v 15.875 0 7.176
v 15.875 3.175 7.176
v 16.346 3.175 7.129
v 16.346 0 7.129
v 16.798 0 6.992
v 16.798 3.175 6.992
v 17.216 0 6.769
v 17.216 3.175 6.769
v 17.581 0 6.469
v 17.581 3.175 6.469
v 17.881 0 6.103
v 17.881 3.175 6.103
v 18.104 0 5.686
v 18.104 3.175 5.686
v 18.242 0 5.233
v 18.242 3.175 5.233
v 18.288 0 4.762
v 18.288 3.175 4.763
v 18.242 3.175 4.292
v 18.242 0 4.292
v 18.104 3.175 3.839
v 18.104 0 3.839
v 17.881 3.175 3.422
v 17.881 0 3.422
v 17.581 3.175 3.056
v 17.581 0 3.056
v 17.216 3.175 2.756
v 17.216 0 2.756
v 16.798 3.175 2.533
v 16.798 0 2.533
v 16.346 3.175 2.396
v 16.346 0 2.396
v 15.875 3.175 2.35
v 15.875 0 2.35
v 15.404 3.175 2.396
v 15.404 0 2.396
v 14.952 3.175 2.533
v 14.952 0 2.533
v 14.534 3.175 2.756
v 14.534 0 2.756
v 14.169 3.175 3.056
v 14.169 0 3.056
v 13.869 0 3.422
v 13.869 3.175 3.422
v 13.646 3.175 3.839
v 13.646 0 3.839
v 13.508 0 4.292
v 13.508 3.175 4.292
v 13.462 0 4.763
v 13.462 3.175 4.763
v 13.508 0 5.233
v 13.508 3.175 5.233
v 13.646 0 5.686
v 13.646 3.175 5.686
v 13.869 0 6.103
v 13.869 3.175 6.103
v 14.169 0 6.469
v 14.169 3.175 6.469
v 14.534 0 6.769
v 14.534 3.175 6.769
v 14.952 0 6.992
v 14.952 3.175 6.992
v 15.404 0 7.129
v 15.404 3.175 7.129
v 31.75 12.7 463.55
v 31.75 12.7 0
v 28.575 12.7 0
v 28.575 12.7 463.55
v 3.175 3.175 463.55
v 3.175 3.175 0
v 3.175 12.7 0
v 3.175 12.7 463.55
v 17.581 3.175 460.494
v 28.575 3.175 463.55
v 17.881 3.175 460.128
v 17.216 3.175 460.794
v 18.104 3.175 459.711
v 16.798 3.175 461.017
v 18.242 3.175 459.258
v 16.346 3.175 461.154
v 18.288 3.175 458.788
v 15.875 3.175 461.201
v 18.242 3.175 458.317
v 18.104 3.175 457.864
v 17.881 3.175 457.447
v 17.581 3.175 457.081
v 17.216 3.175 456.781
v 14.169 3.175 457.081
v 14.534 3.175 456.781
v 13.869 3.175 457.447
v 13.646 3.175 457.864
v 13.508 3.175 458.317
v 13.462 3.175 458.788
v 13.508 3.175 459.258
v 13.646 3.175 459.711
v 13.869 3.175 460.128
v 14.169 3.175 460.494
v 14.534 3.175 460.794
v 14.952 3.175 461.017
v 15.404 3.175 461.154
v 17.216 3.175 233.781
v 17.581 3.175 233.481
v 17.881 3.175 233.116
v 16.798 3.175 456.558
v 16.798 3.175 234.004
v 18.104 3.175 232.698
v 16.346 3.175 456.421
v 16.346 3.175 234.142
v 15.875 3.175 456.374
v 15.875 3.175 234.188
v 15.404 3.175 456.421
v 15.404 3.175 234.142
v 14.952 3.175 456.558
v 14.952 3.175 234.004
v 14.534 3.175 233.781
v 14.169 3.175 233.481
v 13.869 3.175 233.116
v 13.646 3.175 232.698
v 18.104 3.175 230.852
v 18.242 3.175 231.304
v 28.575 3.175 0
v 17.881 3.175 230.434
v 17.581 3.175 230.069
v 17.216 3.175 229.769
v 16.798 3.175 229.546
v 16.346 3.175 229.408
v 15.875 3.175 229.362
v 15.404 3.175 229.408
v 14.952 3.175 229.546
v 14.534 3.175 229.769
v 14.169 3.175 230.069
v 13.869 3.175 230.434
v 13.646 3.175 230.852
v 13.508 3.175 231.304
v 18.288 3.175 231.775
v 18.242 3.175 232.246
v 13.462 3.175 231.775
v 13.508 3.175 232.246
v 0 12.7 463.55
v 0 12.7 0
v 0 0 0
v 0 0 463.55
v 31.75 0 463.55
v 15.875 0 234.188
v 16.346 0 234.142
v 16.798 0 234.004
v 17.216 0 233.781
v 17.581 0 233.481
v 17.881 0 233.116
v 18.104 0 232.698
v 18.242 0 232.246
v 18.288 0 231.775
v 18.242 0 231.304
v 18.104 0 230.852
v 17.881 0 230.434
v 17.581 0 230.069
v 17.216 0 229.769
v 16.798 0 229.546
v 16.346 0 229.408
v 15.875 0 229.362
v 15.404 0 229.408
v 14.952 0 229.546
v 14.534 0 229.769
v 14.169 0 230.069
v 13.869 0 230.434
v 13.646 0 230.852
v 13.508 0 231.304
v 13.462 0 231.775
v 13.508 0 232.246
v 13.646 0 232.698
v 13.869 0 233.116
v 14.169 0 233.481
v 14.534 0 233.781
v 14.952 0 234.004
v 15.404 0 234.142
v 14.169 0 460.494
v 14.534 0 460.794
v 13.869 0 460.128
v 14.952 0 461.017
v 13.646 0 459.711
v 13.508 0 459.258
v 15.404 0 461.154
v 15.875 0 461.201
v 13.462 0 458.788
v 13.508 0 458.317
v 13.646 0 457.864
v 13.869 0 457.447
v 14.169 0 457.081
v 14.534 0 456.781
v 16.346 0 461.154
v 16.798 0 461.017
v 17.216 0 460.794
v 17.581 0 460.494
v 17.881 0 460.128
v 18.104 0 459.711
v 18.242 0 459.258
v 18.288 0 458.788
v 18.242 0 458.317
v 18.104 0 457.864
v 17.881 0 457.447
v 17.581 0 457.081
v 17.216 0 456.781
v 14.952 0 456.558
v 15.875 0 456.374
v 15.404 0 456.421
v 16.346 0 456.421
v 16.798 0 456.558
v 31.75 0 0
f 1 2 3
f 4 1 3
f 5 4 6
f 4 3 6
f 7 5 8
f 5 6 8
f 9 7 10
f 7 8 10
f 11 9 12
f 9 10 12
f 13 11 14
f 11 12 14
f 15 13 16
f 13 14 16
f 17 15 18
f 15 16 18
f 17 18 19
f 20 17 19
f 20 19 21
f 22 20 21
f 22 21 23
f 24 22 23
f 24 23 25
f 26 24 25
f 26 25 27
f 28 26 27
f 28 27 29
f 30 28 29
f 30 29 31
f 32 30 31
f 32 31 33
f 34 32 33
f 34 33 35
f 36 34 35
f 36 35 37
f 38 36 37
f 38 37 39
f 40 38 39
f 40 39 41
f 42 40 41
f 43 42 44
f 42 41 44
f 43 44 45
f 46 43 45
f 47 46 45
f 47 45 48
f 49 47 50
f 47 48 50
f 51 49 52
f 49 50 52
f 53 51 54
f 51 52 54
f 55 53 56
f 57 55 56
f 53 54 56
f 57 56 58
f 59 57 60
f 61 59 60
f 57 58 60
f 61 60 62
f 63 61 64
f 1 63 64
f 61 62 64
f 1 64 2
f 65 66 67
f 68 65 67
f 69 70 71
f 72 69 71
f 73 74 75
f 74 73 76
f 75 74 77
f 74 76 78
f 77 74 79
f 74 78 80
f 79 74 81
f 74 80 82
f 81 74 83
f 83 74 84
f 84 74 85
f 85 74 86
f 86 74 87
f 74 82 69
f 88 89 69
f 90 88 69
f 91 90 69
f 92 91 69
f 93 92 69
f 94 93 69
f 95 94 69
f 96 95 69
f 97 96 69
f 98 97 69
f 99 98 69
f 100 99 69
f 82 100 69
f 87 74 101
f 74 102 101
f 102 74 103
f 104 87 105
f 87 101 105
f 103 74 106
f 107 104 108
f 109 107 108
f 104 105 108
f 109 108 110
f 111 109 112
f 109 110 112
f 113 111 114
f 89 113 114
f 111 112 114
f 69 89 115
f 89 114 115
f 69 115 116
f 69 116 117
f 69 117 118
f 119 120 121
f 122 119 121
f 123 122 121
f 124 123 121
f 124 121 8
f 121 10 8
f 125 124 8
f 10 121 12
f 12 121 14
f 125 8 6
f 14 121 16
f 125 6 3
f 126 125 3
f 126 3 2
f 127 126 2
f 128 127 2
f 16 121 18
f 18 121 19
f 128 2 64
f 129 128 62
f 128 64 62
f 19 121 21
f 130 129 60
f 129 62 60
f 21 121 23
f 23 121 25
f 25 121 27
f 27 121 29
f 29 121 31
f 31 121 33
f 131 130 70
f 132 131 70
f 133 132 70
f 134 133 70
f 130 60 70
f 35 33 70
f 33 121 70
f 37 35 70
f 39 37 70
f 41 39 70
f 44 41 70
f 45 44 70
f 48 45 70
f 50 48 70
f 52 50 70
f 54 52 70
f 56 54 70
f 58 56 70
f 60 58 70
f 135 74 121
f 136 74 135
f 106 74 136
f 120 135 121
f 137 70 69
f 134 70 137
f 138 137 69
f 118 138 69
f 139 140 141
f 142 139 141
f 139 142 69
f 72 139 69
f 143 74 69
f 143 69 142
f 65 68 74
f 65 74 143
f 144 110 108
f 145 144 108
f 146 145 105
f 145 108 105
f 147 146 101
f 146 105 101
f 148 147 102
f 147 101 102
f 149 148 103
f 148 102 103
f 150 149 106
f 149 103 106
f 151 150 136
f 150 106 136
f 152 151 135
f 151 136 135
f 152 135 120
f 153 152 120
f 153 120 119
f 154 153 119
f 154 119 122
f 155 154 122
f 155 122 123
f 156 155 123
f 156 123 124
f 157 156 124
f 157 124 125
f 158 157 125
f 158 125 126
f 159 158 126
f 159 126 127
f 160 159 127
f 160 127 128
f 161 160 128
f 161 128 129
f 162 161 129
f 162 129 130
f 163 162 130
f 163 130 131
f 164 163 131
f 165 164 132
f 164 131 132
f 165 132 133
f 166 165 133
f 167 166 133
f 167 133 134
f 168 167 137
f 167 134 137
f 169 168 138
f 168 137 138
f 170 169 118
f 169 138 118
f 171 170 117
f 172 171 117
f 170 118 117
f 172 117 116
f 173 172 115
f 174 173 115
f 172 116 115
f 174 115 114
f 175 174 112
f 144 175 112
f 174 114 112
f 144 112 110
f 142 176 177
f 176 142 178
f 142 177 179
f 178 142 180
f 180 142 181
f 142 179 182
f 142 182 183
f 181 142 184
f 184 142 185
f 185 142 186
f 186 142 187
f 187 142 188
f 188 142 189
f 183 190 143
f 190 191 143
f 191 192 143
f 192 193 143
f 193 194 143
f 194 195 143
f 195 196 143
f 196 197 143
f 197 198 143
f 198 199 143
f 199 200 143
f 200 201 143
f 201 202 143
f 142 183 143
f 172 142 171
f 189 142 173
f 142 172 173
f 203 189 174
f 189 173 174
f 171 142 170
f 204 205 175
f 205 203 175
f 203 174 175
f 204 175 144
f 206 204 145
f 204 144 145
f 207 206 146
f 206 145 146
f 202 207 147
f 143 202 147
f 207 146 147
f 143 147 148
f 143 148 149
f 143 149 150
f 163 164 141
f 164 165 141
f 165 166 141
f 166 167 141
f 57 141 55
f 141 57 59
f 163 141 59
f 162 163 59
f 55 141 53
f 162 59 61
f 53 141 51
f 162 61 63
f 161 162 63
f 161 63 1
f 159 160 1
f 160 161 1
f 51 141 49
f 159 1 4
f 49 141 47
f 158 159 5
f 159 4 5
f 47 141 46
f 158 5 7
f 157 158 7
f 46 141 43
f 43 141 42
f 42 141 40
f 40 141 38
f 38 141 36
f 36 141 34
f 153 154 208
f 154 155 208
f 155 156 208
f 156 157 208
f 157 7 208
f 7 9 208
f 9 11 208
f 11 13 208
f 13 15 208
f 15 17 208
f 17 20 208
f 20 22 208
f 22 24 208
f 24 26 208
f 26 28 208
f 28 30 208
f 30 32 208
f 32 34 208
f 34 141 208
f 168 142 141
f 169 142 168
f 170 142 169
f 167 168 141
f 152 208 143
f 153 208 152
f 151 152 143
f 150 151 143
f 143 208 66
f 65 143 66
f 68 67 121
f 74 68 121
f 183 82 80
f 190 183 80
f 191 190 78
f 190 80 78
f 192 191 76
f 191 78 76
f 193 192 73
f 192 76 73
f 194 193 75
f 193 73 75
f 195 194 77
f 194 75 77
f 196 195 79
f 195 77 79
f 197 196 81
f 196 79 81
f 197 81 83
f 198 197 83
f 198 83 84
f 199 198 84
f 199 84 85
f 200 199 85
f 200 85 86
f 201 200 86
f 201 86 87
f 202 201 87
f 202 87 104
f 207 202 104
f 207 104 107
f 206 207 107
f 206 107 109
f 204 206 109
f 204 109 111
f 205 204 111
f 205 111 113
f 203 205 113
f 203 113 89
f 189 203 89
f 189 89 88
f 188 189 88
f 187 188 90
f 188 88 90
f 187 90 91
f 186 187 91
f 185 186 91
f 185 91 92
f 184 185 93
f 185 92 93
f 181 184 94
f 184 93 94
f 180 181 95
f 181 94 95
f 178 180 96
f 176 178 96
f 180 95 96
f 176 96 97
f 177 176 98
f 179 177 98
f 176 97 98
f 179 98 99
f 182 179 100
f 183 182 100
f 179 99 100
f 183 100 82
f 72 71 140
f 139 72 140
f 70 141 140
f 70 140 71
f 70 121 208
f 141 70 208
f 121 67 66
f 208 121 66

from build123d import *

# Parameters (mm, degrees)
BOSS_EXTRUDE1_DEPTH = 463.55
CUT_EXTRUDE1_REACH  = 466.734
SKETCH2_R           = 2.413
CUT_EXTRUDE2_REACH  = 466.734
SKETCH3_R           = 2.413


with BuildPart() as part:
    # Sketch1 → Boss-Extrude1 (new body)
    with BuildSketch(Plane.XY):
        Polygon((3.175, 3.175), (3.175, 12.7), (0, 12.7), (0, 0), (31.75, 0), (31.75, 12.7), (28.575, 12.7), (28.575, 3.175), align=None)
    extrude(amount=BOSS_EXTRUDE1_DEPTH)

    # Sketch2 → Cut-Extrude1 (cut, up to next)
    with BuildSketch(Plane(origin=(0, 3.175, 0), x_dir=(1, 0, 0), z_dir=(0, 1, 0)), mode=Mode.PRIVATE) as cut_extrude1_sk1:
        with Locations(Location((15.875, -458.7875, 0), (0, 0, 270))):
            Circle(SKETCH2_R)
    cut_extrude1_tool1 = extrude(cut_extrude1_sk1.sketch, amount=-CUT_EXTRUDE1_REACH, mode=Mode.PRIVATE) & part.part
    # Sketch2 → Cut-Extrude1 (cut, up to next)
    with BuildSketch(Plane(origin=(0, 3.175, 0), x_dir=(1, 0, 0), z_dir=(0, 1, 0)), mode=Mode.PRIVATE) as cut_extrude1_sk2:
        with Locations(Location((15.875, -4.7625, 0), (0, 0, 270))):
            Circle(SKETCH2_R)
    cut_extrude1_tool2 = extrude(cut_extrude1_sk2.sketch, amount=-CUT_EXTRUDE1_REACH, mode=Mode.PRIVATE) & part.part
    add(cut_extrude1_tool1.solids().sort_by_distance((15.875, 3.175, 458.7875))[0], mode=Mode.SUBTRACT)
    add(cut_extrude1_tool2.solids().sort_by_distance((15.875, 3.175, 4.7625))[0], mode=Mode.SUBTRACT)

    # Sketch3 → Cut-Extrude2 (cut, up to next)
    with BuildSketch(Plane(origin=(0, 3.175, 0), x_dir=(1, 0, 0), z_dir=(0, 1, 0)), mode=Mode.PRIVATE) as cut_extrude2_sk1:
        with Locations(Location((15.875, -231.775, 0), (0, 0, 270))):
            Circle(SKETCH3_R)
    cut_extrude2_tool1 = extrude(cut_extrude2_sk1.sketch, amount=-CUT_EXTRUDE2_REACH, mode=Mode.PRIVATE) & part.part
    add(cut_extrude2_tool1.solids().sort_by_distance((15.875, 3.175, 231.775))[0], mode=Mode.SUBTRACT)


solid = part.part
